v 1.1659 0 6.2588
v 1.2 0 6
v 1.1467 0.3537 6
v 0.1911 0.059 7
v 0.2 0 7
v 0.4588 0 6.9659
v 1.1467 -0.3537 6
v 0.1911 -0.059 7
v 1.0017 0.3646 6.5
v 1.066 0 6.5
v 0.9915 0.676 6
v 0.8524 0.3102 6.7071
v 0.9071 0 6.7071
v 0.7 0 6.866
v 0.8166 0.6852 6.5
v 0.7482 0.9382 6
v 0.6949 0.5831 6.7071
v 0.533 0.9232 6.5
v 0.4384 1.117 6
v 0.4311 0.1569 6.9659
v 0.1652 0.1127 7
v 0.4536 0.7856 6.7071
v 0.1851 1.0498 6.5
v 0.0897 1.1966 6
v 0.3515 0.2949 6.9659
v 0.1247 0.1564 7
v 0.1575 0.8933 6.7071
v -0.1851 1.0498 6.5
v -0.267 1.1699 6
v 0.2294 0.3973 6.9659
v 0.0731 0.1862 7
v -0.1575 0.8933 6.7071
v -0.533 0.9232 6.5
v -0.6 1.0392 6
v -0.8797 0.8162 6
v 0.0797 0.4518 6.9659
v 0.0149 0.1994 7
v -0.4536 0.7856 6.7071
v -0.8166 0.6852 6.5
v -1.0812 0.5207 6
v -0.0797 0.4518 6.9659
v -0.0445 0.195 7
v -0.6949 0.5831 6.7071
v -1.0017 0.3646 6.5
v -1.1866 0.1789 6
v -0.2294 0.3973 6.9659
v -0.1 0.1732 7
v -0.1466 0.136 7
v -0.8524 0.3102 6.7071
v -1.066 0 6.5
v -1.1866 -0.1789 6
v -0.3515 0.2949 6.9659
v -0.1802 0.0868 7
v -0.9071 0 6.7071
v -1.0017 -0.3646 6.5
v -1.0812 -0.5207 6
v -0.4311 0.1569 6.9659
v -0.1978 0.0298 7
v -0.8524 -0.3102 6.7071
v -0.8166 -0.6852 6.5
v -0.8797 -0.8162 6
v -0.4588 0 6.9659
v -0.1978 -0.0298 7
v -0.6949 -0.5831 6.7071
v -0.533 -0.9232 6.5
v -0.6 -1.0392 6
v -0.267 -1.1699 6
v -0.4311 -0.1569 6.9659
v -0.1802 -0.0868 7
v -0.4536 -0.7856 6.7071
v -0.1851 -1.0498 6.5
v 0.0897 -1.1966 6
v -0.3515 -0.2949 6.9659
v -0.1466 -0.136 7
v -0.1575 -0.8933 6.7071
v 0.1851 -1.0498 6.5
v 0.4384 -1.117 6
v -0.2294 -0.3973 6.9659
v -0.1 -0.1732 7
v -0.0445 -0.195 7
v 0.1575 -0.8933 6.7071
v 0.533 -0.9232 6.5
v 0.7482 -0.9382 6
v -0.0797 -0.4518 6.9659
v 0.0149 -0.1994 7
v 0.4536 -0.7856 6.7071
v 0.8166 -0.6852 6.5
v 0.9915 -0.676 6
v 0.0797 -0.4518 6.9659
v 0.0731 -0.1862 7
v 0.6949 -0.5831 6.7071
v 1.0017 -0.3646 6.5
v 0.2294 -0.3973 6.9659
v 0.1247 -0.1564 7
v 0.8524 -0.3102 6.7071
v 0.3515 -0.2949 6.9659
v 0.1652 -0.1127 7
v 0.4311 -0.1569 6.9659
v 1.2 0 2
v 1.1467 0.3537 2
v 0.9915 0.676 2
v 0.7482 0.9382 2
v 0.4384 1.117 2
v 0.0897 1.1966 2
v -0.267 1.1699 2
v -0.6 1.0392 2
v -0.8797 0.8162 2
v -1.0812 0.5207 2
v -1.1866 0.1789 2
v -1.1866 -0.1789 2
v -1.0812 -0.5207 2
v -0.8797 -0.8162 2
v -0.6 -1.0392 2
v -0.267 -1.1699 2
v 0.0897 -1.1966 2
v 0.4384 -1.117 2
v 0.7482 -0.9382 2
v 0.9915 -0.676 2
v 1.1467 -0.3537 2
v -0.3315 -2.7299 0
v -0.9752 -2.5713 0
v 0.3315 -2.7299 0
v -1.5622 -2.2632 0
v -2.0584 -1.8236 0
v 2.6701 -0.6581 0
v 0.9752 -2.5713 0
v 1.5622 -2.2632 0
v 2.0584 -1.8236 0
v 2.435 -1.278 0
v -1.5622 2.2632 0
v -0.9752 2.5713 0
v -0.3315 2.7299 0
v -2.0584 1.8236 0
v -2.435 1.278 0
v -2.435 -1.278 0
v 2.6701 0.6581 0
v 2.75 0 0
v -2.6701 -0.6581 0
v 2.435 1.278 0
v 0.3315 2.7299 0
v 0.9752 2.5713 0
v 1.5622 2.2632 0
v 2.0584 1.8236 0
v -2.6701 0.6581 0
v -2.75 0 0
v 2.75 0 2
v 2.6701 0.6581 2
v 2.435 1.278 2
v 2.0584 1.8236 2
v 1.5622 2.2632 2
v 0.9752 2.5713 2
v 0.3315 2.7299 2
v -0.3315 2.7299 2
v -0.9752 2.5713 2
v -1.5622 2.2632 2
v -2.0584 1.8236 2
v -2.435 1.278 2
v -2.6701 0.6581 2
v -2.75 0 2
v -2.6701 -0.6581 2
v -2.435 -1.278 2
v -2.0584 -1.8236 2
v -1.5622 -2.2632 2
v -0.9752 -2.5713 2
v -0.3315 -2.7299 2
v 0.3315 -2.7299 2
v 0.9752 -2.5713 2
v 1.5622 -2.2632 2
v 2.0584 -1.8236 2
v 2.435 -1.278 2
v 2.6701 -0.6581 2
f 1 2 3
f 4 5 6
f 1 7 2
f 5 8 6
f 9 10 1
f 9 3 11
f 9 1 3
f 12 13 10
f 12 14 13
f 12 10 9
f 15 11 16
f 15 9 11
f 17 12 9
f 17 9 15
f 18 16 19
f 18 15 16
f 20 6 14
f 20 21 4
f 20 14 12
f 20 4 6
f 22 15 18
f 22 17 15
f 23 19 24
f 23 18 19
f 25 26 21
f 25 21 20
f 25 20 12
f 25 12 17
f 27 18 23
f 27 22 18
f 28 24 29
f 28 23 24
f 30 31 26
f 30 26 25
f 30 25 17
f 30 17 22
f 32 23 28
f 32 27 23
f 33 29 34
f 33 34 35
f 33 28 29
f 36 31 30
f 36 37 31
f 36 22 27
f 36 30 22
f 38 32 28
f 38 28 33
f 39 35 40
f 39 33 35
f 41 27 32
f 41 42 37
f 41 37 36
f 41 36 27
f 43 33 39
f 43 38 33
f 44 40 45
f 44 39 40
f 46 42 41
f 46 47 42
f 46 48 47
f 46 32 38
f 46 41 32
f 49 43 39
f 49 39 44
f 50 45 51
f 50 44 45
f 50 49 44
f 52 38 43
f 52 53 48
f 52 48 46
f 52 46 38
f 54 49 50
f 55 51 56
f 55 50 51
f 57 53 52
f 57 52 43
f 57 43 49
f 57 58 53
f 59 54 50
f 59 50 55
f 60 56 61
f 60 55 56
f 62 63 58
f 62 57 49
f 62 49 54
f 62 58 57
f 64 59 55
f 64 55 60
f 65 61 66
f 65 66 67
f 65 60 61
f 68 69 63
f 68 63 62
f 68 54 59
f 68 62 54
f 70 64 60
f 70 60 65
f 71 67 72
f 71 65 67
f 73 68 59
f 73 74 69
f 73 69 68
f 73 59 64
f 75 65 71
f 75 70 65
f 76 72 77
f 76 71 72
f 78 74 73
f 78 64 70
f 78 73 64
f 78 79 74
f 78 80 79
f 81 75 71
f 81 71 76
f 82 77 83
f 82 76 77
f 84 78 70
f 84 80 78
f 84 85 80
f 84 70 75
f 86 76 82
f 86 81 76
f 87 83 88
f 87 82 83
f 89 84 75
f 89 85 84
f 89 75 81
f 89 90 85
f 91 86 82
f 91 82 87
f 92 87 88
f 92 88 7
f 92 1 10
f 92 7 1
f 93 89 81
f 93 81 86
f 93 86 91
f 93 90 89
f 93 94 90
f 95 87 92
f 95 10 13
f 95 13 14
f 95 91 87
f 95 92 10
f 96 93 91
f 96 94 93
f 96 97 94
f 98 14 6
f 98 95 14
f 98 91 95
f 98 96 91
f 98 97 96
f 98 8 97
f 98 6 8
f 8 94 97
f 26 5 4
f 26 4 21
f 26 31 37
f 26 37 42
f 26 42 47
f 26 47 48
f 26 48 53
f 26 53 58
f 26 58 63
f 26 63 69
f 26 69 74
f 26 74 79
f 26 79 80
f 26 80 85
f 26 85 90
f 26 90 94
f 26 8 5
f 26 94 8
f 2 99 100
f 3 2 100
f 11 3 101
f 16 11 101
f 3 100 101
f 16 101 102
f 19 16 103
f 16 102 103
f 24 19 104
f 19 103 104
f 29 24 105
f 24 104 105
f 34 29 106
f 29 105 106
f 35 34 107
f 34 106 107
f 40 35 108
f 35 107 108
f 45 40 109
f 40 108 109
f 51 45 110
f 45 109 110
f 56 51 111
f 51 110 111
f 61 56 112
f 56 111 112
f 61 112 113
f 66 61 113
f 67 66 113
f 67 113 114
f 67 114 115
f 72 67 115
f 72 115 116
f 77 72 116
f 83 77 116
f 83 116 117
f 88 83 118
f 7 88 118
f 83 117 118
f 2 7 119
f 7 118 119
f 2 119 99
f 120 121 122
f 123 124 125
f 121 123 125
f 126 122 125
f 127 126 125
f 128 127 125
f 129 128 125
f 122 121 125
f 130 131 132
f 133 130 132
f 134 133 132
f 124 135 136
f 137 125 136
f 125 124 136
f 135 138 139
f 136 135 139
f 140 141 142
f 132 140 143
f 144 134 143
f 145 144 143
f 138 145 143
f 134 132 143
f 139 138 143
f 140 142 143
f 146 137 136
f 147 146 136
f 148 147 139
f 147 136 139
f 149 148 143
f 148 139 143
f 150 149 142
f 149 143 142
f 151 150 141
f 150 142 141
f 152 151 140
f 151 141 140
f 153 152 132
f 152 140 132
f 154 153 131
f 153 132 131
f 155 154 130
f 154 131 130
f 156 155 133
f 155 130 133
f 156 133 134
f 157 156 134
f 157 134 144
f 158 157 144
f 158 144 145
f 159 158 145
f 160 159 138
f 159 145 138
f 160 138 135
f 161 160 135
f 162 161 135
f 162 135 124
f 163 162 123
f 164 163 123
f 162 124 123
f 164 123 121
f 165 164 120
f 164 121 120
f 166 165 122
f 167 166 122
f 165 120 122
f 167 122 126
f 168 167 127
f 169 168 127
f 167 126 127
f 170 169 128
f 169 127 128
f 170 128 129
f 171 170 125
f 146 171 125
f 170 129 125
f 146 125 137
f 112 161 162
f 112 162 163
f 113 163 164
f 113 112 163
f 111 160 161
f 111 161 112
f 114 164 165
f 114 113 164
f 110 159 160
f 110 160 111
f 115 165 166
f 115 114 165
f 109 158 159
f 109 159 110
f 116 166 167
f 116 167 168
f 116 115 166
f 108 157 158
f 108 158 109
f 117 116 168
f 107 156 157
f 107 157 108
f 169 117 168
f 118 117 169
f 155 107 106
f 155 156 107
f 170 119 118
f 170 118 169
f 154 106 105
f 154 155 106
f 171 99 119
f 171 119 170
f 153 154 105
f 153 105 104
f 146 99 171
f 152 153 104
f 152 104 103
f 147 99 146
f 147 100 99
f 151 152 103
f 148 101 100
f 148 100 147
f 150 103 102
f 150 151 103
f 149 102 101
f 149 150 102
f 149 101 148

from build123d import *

# Parameters (mm, degrees)
SKETCH_R     = 2.75
PAD_DEPTH    = 2
SKETCH001_R  = 1.2
PAD001_DEPTH = 5
FILLET_R     = 1


with BuildPart() as part:
    # Sketch → Pad (new body)
    with BuildSketch(Plane.XY):
        Circle(SKETCH_R)
    extrude(amount=PAD_DEPTH)

    # Sketch001 (on Face3 of Pad) → Pad001 (join)
    with BuildSketch(Plane.XY.offset(2)):
        Circle(SKETCH001_R)
    extrude(amount=PAD001_DEPTH)

    # Fillet
    fillet_edges = [part.edges().sort_by_distance(p)[0] for p in [
        (-1.2, 0, 7),
    ]]
    fillet(fillet_edges, radius=FILLET_R)


solid = part.part
